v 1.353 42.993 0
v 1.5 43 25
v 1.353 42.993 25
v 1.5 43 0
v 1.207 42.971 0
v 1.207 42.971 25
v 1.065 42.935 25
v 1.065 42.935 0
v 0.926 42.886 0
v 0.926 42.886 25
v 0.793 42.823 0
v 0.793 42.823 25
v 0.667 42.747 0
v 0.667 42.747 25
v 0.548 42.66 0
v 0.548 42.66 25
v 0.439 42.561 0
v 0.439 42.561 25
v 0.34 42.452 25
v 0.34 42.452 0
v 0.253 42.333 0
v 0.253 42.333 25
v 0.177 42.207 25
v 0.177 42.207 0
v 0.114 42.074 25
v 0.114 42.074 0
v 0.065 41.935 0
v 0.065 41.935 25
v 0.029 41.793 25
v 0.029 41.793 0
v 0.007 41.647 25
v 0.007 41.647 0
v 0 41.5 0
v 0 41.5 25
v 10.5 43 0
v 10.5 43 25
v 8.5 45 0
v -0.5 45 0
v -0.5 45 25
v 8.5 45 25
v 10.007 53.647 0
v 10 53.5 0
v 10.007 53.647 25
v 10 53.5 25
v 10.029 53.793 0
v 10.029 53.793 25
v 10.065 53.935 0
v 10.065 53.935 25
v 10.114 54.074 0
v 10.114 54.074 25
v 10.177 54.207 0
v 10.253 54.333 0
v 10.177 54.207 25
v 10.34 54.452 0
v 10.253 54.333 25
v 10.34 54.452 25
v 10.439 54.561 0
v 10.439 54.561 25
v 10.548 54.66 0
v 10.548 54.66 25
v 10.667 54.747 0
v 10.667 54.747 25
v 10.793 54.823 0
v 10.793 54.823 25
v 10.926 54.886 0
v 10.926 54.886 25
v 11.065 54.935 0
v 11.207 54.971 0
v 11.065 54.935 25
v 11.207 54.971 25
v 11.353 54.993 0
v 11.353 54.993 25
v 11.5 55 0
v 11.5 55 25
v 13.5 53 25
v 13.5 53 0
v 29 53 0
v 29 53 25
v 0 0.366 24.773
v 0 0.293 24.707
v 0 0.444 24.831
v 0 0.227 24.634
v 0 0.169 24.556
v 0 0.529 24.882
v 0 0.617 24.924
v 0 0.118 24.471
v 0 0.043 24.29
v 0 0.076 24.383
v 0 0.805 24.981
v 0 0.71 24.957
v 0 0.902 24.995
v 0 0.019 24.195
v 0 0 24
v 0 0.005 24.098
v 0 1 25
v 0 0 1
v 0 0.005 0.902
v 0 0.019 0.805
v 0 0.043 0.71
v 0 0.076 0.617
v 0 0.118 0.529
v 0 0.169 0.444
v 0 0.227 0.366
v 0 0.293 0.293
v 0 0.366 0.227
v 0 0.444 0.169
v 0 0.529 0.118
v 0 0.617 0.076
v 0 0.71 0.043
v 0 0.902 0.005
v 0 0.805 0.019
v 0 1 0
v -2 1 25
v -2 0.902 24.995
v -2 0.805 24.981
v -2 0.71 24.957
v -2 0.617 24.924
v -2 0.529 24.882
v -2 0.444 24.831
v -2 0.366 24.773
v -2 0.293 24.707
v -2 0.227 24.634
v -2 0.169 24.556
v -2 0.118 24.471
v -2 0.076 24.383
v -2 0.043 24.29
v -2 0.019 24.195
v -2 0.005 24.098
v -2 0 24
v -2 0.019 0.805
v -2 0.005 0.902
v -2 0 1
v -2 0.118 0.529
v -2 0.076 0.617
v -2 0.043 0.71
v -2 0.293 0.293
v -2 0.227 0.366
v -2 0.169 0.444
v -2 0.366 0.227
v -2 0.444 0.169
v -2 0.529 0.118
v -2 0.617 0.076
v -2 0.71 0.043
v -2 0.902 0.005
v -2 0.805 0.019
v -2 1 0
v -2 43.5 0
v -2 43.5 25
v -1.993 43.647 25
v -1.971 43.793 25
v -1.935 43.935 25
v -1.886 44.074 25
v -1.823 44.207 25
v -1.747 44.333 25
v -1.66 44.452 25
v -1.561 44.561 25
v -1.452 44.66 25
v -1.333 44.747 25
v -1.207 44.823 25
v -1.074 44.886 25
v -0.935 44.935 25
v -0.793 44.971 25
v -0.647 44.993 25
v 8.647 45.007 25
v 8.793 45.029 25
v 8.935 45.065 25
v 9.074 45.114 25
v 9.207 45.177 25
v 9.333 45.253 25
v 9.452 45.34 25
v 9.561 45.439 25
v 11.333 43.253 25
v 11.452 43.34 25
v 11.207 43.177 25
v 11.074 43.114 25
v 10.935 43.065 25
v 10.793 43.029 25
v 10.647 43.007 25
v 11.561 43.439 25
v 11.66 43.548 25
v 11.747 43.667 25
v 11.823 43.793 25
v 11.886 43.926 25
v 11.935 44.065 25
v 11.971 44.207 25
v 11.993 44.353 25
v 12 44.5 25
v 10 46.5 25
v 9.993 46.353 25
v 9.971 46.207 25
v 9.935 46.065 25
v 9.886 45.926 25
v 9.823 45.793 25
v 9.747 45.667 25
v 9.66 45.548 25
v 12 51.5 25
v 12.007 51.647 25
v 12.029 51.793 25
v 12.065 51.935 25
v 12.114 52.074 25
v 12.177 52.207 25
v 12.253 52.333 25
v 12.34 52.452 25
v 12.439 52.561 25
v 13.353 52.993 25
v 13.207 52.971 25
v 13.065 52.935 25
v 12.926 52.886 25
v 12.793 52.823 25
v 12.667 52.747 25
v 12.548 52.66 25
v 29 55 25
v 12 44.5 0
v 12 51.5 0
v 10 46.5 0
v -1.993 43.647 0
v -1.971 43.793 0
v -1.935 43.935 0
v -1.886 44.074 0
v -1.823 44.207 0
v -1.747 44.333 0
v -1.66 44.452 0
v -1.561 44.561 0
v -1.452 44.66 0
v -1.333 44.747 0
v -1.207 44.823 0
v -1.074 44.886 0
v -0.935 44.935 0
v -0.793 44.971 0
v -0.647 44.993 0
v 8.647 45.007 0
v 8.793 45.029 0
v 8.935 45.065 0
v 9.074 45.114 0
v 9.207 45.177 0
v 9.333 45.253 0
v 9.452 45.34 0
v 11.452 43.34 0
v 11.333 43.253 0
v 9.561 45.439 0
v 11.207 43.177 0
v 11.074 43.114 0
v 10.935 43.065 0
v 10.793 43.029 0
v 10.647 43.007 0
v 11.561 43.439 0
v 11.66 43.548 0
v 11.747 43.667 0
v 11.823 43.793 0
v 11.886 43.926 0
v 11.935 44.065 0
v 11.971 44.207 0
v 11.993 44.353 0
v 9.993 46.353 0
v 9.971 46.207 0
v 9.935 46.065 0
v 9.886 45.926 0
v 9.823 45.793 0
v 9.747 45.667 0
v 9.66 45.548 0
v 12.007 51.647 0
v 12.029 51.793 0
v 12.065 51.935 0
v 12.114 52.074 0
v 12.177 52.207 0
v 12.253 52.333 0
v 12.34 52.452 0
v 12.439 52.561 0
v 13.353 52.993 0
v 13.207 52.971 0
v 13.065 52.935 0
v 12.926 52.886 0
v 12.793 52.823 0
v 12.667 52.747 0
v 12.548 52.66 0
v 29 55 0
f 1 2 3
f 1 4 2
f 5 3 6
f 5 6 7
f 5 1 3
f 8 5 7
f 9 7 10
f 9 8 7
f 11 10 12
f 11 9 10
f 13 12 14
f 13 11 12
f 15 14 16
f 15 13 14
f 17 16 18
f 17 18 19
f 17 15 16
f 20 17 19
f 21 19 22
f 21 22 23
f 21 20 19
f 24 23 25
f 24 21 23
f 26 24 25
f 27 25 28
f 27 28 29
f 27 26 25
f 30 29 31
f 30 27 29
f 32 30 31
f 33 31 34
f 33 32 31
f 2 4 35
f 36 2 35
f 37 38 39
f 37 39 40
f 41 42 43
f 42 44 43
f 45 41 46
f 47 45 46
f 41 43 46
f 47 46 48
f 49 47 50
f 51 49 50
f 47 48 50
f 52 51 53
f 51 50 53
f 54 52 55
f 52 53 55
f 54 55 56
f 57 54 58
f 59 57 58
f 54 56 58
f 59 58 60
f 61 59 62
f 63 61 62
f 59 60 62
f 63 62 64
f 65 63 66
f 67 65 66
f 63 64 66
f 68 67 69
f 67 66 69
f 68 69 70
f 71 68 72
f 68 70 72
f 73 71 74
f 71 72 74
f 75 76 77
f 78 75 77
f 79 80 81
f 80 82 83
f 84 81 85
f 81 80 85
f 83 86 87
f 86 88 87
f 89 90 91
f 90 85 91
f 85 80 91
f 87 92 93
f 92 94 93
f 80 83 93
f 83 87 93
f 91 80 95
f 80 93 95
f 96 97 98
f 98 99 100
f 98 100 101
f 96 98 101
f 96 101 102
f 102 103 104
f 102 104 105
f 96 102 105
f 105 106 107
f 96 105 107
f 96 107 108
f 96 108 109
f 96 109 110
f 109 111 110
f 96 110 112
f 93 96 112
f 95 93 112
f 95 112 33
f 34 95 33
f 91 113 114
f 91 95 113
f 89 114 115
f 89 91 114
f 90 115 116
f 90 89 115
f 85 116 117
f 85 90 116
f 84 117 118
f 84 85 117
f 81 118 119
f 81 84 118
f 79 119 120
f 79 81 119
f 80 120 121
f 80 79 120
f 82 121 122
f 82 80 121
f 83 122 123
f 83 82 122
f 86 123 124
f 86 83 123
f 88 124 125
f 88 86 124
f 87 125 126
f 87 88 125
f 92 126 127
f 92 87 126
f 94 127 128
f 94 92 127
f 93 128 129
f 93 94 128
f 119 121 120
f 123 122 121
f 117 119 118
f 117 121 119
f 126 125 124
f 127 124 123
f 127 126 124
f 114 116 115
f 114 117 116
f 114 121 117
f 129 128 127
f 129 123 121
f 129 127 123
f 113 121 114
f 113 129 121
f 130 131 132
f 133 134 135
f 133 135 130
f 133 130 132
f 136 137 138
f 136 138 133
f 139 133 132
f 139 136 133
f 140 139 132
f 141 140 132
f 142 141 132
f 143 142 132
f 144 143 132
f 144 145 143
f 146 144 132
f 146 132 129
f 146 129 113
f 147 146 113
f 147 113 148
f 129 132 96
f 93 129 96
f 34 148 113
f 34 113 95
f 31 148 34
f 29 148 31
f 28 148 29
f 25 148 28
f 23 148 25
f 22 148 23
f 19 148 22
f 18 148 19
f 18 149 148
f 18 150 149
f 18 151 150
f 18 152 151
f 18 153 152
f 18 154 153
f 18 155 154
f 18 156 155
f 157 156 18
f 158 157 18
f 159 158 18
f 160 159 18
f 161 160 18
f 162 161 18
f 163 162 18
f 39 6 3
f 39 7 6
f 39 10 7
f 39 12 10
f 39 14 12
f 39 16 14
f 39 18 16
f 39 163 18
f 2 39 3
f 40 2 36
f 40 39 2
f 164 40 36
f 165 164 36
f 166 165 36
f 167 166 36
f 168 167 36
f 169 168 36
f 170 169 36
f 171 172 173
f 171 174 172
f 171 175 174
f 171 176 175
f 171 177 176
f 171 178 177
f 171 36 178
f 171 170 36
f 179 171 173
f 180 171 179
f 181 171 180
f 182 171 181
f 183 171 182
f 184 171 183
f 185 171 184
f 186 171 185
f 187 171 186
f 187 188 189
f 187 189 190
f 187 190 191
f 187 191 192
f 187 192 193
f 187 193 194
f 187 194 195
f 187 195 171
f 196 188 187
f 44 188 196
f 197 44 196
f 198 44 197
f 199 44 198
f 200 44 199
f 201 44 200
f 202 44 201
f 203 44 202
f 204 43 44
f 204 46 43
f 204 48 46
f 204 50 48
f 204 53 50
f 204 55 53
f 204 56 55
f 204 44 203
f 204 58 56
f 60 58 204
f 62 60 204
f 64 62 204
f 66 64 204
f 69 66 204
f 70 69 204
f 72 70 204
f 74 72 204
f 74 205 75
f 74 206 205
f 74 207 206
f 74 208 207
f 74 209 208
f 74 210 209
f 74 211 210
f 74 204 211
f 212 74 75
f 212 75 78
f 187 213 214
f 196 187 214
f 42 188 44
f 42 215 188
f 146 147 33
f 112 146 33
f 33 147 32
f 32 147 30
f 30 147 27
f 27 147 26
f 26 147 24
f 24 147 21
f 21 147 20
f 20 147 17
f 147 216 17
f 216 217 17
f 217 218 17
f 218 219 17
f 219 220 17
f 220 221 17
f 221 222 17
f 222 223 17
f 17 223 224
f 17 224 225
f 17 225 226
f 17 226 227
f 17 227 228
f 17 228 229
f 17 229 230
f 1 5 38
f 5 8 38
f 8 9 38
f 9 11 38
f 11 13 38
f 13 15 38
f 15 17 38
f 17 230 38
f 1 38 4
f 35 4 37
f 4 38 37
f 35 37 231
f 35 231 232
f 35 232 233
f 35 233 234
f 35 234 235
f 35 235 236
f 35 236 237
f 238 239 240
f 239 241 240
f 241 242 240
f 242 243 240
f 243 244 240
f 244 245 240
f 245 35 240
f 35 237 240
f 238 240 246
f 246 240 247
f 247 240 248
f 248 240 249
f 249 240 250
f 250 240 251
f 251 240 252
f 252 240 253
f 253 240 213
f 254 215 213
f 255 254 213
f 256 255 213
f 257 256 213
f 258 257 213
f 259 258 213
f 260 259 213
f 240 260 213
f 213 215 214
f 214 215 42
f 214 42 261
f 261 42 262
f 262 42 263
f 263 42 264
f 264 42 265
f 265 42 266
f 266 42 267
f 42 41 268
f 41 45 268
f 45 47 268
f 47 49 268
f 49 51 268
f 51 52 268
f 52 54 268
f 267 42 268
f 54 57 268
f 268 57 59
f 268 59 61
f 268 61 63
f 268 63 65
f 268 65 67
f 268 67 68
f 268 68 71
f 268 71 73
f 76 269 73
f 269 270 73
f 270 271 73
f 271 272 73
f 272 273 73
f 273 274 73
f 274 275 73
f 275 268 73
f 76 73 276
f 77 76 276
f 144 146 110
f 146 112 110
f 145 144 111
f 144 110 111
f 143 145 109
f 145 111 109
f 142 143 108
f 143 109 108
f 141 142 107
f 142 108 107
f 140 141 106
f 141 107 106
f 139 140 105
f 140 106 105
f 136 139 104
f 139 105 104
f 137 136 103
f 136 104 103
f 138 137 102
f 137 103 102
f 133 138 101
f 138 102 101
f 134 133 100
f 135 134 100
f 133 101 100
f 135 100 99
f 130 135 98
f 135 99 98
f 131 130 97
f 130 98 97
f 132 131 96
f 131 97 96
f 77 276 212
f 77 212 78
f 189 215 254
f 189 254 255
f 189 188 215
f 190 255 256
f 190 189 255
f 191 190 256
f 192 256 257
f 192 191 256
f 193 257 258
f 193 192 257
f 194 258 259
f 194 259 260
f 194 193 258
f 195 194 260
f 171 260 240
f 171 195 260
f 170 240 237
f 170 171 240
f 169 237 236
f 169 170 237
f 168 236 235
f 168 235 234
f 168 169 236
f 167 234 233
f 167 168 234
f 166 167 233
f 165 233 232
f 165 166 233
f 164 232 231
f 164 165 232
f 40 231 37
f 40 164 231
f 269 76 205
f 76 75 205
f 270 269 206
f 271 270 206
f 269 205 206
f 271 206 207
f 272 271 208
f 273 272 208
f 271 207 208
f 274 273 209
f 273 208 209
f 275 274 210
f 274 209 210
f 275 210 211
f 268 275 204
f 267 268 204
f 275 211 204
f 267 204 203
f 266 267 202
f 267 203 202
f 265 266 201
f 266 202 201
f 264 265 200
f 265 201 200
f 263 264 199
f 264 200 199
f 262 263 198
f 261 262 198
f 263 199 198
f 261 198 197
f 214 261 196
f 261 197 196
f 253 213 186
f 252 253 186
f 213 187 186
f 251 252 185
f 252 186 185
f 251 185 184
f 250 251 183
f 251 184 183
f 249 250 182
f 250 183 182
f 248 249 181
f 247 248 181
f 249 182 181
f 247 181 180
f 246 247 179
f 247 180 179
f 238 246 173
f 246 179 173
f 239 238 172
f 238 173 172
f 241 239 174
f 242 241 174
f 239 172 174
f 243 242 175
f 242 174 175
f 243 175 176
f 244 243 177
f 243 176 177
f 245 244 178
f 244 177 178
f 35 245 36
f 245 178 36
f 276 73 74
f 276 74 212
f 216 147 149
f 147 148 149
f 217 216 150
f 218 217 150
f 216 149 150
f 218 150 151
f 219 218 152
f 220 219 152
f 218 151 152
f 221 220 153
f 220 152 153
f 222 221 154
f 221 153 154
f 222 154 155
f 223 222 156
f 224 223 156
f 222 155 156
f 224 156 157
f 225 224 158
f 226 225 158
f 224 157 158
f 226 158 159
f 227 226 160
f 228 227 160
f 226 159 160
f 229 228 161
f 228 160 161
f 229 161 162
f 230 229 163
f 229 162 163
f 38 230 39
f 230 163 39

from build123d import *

# Parameters (mm, degrees)
BOX003_W               = 2
BOX003_H               = 19
BOX003_DEPTH           = 25
BOX003_PLACEMENT_ANGLE = -90
BOX002_W               = 2
BOX002_H               = 8
BOX002_DEPTH           = 25
BOX001_W               = 2
BOX001_H               = 13
BOX001_DEPTH           = 25
BOX001_PLACEMENT_ANGLE = -90
BOX_W                  = 2
BOX_H                  = 45
BOX_DEPTH              = 25
FILLET006_R            = 1.5
FILLET007_R            = 1


with BuildPart() as box003:
    # Box003 → Box003 (new body)
    with BuildSketch(Plane.XY):
        with Locations((1, 9.5)):
            Rectangle(BOX003_W, BOX003_H)
    extrude(amount=BOX003_DEPTH)


with BuildPart() as box003_1:
    # Box003 placement: moved
    add(box003.part.moved(Location((10, 55, 0))).rotate(Axis((10, 55, 0), (0, 0, 1)), BOX003_PLACEMENT_ANGLE))


with BuildPart() as box002:
    # Box002 → Box002 (new body)
    with BuildSketch(Plane(origin=(10, 45, 0), x_dir=(1, 0, 0), z_dir=(0, 0, 1))):
        with Locations((1, 4)):
            Rectangle(BOX002_W, BOX002_H)
    extrude(amount=BOX002_DEPTH)


with BuildPart() as box001:
    # Box001 → Box001 (new body)
    with BuildSketch(Plane.XY):
        with Locations((1, 6.5)):
            Rectangle(BOX001_W, BOX001_H)
    extrude(amount=BOX001_DEPTH)


with BuildPart() as box001_1:
    # Box001 placement: moved
    add(box001.part.moved(Location((-1, 45, 0))).rotate(Axis((-1, 45, 0), (0, 0, 1)), BOX001_PLACEMENT_ANGLE))


with BuildPart() as ejex_guia_metal:
    # Box → Box (new body)
    with BuildSketch(Plane(origin=(-2, 0, 0), x_dir=(1, 0, 0), z_dir=(0, 0, 1))):
        with Locations((1, 22.5)):
            Rectangle(BOX_W, BOX_H)
    extrude(amount=BOX_DEPTH)

    # Fusion: union Box001
    add(box001_1.part)

    # Fusion001: union Box003, Box002
    add(box003_1.part)
    add(box002.part)

    # Fillet006
    fillet006_edges = [ejex_guia_metal.edges().sort_by_distance(p)[0] for p in [
        (-2, 45, 12.5),
        (10, 45, 12.5),
        (0, 43, 12.5),
        (12, 43, 12.5),
        (10, 55, 12.5),
        (12, 53, 12.5),
    ]]
    fillet(fillet006_edges, radius=FILLET006_R)

    # Fillet007
    fillet007_edges = [ejex_guia_metal.edges().sort_by_distance(p)[0] for p in [
        (-1, 0, 25),
        (-1, 0, 0),
    ]]
    fillet(fillet007_edges, radius=FILLET007_R)


solid = ejex_guia_metal.part
